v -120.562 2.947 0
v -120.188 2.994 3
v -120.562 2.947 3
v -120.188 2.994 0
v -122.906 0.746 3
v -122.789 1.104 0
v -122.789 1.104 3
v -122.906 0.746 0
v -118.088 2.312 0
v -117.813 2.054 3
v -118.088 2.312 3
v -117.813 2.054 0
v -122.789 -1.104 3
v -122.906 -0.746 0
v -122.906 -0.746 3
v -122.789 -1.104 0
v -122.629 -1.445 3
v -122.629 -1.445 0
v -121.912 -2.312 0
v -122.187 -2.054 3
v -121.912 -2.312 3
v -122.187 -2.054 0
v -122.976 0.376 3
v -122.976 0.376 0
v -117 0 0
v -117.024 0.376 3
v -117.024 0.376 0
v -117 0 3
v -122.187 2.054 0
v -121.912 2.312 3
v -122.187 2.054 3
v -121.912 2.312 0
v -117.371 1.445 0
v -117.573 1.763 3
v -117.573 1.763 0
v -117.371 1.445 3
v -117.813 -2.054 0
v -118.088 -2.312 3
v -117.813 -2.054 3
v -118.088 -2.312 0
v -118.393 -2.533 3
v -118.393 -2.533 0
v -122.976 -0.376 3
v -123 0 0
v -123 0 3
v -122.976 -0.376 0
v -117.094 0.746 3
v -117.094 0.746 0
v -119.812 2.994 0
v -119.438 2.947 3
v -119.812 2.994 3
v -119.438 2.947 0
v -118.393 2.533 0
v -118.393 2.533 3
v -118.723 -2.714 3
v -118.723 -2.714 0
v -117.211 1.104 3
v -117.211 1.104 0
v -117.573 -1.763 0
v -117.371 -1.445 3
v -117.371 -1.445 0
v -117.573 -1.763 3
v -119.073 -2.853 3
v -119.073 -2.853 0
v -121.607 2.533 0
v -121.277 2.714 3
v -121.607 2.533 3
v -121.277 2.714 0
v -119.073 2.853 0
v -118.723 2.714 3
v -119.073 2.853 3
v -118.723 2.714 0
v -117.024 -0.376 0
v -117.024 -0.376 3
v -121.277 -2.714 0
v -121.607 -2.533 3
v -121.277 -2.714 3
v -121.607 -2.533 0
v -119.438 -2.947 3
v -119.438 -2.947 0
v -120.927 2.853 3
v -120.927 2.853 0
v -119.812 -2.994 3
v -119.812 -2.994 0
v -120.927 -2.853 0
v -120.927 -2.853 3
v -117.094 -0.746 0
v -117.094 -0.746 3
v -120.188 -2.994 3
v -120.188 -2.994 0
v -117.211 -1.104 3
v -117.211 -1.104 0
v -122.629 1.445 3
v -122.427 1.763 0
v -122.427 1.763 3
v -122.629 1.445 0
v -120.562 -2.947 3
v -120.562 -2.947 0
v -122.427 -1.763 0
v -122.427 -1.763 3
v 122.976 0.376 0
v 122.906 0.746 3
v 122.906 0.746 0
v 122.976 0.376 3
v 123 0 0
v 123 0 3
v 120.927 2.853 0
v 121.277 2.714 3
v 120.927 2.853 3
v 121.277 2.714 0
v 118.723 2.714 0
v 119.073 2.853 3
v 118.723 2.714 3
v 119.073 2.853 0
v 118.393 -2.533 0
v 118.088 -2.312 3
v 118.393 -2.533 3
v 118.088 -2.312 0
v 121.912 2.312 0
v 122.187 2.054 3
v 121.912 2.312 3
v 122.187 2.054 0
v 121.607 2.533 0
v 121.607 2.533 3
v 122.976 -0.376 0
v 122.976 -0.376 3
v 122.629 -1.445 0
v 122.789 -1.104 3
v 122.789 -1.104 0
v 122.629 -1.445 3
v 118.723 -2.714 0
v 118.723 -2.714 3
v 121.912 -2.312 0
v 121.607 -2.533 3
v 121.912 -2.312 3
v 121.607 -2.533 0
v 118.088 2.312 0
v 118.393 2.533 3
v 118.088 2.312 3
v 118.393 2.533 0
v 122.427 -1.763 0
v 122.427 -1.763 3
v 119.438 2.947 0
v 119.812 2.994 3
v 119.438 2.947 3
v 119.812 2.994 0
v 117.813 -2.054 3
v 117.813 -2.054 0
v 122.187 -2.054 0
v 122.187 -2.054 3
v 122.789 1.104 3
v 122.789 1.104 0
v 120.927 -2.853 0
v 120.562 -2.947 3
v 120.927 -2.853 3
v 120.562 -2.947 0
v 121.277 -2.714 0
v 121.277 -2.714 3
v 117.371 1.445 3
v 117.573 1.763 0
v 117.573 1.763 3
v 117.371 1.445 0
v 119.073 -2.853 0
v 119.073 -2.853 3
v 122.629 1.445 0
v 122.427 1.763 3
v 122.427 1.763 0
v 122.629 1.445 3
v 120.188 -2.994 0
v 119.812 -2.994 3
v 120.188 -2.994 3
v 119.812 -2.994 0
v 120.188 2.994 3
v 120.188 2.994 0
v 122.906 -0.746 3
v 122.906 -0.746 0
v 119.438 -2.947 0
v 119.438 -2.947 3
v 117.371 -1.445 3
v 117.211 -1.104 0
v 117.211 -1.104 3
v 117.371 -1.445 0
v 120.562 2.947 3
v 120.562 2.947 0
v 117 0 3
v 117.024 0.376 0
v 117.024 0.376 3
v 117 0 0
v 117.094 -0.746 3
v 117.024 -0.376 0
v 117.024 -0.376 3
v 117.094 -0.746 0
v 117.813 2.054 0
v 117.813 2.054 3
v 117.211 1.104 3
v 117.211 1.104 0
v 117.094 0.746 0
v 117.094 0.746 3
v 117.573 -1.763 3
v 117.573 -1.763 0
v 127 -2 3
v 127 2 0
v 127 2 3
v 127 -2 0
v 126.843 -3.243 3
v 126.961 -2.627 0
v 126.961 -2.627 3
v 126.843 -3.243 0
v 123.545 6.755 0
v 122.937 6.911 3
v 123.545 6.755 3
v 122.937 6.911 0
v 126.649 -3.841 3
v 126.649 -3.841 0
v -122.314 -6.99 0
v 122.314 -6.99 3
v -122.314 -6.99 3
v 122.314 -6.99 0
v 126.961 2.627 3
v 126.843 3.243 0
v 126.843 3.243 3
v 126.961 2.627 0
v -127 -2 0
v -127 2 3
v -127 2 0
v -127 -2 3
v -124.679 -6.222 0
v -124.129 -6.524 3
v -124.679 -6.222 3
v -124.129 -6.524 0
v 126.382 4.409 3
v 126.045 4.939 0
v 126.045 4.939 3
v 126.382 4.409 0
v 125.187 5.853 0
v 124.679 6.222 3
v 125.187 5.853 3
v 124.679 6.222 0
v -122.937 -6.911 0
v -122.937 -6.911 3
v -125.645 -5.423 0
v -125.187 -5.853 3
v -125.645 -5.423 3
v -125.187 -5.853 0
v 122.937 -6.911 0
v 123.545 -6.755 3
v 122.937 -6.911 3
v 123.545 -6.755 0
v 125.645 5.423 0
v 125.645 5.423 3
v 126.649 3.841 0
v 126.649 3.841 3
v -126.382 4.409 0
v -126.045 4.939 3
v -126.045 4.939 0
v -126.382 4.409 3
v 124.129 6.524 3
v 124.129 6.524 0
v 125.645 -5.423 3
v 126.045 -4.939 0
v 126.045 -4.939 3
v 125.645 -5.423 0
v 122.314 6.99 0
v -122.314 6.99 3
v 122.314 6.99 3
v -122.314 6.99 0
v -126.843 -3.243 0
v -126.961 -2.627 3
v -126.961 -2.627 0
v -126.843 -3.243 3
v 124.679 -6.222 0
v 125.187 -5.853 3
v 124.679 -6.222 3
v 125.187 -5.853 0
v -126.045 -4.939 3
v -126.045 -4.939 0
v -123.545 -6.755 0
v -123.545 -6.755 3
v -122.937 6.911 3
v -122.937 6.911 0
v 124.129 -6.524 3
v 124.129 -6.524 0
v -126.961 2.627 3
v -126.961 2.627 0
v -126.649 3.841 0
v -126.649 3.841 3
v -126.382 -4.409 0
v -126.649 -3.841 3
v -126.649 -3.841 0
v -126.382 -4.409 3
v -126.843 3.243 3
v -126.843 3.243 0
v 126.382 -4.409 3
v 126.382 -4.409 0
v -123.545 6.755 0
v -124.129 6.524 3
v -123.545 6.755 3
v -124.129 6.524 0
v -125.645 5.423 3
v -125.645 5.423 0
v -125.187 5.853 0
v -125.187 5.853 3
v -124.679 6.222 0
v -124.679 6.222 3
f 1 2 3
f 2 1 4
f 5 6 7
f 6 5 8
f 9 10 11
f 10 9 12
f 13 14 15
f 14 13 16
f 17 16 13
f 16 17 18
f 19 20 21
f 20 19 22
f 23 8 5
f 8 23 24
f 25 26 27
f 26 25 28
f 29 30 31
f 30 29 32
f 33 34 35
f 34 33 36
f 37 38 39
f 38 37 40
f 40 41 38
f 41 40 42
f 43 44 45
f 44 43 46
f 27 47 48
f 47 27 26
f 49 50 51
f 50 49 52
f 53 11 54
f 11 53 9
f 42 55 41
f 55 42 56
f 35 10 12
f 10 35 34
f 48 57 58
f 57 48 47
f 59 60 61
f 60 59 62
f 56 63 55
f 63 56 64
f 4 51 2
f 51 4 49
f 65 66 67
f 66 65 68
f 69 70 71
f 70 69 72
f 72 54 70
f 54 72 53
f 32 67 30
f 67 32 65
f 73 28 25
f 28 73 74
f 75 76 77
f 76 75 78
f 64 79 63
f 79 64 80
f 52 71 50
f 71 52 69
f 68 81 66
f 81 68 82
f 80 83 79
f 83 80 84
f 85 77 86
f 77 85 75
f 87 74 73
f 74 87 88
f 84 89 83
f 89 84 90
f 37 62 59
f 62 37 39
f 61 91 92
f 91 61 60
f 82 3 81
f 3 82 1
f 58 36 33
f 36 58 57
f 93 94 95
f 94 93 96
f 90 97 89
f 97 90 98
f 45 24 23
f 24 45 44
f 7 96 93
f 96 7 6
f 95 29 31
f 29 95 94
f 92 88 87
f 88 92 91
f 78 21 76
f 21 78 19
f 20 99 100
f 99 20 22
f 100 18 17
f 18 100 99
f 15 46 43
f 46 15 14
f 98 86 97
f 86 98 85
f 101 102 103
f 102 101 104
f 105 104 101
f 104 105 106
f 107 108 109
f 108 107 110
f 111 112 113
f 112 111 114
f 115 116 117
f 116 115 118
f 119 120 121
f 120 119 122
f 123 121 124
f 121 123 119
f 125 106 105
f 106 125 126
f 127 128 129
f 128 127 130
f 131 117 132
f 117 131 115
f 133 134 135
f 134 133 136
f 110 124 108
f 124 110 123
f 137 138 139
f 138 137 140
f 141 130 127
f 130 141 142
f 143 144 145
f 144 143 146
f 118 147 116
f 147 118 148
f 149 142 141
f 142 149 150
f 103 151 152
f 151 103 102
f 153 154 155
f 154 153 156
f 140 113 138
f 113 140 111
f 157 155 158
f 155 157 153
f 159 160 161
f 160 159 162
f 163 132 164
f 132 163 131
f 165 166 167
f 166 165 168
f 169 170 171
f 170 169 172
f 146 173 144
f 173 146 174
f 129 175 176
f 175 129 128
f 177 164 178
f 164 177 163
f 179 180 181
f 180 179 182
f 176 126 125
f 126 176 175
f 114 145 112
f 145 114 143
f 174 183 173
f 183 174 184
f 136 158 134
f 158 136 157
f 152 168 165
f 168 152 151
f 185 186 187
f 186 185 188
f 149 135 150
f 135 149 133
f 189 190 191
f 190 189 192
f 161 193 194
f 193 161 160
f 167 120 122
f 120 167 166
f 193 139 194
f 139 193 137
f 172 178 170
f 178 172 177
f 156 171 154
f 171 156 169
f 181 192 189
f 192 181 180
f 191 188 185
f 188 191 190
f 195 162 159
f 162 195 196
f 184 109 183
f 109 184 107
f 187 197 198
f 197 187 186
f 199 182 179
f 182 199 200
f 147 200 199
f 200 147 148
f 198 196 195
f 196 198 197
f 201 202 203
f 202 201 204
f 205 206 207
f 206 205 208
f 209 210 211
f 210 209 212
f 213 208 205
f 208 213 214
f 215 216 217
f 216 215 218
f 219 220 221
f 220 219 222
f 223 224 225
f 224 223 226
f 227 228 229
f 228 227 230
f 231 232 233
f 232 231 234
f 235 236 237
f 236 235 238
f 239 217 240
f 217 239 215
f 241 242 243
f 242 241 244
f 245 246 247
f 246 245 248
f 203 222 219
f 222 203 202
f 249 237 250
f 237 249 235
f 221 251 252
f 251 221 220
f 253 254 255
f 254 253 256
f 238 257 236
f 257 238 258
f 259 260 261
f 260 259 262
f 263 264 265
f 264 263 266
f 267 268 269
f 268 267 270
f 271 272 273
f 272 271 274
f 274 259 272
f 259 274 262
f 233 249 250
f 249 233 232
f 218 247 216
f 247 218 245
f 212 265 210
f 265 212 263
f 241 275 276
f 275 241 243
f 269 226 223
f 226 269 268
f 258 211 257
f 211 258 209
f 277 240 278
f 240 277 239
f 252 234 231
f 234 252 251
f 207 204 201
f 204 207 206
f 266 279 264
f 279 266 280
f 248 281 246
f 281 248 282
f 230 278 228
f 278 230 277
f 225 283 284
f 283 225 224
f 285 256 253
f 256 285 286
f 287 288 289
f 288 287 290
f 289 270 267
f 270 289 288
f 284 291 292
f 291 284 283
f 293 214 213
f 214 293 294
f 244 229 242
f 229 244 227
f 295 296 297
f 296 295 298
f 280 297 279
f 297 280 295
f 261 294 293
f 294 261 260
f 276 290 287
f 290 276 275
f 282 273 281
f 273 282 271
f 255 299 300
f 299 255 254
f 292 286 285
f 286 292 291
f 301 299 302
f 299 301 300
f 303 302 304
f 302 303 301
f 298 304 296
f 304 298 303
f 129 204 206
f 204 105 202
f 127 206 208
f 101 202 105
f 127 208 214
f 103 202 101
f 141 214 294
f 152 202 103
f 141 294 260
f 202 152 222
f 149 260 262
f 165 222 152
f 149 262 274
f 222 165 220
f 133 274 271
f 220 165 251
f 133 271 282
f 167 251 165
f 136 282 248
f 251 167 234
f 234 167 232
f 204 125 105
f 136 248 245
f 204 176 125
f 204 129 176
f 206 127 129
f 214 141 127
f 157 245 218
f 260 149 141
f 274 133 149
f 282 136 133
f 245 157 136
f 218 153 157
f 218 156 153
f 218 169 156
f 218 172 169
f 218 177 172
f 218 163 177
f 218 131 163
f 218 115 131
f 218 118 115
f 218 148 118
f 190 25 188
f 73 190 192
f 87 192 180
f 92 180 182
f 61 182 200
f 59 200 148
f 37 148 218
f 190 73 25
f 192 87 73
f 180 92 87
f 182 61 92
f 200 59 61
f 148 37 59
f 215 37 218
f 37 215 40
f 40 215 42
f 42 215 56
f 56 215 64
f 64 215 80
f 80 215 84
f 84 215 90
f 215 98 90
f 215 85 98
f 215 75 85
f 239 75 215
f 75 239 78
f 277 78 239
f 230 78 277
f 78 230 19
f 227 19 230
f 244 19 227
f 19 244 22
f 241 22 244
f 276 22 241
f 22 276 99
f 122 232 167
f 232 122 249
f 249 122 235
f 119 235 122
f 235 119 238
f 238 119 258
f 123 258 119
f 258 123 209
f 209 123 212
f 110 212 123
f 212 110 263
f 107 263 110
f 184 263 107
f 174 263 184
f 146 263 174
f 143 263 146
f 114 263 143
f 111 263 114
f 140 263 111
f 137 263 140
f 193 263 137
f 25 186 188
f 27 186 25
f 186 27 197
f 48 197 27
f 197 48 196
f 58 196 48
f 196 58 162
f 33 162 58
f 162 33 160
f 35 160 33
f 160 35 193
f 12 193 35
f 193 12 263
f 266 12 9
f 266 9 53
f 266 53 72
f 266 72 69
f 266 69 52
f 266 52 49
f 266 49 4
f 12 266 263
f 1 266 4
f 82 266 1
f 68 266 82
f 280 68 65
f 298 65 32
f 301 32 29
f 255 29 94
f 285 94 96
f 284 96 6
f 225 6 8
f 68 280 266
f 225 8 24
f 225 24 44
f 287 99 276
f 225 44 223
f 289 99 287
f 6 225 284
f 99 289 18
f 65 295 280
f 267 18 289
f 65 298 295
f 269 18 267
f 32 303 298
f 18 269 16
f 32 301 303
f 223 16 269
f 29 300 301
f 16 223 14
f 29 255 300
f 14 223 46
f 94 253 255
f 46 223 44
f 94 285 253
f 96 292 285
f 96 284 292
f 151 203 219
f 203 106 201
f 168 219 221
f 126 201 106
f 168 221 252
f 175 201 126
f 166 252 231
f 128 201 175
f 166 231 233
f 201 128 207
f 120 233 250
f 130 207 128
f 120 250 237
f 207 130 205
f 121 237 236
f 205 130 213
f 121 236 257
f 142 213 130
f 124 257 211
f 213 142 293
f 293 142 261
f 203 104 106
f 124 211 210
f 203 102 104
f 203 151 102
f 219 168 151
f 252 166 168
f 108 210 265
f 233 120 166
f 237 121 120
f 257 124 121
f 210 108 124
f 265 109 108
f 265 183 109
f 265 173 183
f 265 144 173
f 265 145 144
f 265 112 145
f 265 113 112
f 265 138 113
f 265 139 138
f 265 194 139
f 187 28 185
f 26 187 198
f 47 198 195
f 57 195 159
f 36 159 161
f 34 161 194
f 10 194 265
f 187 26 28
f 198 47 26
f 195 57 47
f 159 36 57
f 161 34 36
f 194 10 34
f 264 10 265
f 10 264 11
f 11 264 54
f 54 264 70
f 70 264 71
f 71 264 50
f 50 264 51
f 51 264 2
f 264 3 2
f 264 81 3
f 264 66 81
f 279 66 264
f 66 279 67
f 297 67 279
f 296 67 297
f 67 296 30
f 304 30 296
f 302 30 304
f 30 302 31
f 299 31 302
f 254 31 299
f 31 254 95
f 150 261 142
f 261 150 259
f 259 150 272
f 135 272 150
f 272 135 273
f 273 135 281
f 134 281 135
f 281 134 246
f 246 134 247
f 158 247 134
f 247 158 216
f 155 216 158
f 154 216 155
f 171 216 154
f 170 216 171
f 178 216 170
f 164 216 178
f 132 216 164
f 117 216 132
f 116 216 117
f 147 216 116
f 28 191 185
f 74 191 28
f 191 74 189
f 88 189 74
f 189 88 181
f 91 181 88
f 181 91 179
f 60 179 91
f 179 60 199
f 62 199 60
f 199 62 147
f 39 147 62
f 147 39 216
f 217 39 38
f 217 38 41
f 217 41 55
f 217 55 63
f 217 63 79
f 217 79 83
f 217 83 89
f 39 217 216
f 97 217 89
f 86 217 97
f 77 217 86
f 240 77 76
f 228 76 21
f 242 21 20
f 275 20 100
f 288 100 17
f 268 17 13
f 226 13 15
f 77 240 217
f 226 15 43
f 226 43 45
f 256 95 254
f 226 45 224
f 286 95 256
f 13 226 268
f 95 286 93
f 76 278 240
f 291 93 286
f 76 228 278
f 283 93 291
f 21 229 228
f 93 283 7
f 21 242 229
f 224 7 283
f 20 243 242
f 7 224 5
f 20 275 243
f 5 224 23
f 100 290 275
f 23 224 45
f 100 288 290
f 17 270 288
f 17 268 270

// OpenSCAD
$fn = 50;


difference() {
	union() {
		hull() {
			translate(v = [-122.0000000000, 2.0000000000, 0]) {
				cylinder(h = 3, r = 5);
			}
			translate(v = [122.0000000000, 2.0000000000, 0]) {
				cylinder(h = 3, r = 5);
			}
			translate(v = [-122.0000000000, -2.0000000000, 0]) {
				cylinder(h = 3, r = 5);
			}
			translate(v = [122.0000000000, -2.0000000000, 0]) {
				cylinder(h = 3, r = 5);
			}
		}
	}
	union() {
		translate(v = [-120.0000000000, 0.0000000000, -100.0000000000]) {
			cylinder(h = 200, r = 3.0000000000);
		}
		translate(v = [-120.0000000000, 0.0000000000, -100.0000000000]) {
			cylinder(h = 200, r = 3.0000000000);
		}
		translate(v = [120.0000000000, 0.0000000000, -100.0000000000]) {
			cylinder(h = 200, r = 3.0000000000);
		}
		translate(v = [120.0000000000, 0.0000000000, -100.0000000000]) {
			cylinder(h = 200, r = 3.0000000000);
		}
	}
}
